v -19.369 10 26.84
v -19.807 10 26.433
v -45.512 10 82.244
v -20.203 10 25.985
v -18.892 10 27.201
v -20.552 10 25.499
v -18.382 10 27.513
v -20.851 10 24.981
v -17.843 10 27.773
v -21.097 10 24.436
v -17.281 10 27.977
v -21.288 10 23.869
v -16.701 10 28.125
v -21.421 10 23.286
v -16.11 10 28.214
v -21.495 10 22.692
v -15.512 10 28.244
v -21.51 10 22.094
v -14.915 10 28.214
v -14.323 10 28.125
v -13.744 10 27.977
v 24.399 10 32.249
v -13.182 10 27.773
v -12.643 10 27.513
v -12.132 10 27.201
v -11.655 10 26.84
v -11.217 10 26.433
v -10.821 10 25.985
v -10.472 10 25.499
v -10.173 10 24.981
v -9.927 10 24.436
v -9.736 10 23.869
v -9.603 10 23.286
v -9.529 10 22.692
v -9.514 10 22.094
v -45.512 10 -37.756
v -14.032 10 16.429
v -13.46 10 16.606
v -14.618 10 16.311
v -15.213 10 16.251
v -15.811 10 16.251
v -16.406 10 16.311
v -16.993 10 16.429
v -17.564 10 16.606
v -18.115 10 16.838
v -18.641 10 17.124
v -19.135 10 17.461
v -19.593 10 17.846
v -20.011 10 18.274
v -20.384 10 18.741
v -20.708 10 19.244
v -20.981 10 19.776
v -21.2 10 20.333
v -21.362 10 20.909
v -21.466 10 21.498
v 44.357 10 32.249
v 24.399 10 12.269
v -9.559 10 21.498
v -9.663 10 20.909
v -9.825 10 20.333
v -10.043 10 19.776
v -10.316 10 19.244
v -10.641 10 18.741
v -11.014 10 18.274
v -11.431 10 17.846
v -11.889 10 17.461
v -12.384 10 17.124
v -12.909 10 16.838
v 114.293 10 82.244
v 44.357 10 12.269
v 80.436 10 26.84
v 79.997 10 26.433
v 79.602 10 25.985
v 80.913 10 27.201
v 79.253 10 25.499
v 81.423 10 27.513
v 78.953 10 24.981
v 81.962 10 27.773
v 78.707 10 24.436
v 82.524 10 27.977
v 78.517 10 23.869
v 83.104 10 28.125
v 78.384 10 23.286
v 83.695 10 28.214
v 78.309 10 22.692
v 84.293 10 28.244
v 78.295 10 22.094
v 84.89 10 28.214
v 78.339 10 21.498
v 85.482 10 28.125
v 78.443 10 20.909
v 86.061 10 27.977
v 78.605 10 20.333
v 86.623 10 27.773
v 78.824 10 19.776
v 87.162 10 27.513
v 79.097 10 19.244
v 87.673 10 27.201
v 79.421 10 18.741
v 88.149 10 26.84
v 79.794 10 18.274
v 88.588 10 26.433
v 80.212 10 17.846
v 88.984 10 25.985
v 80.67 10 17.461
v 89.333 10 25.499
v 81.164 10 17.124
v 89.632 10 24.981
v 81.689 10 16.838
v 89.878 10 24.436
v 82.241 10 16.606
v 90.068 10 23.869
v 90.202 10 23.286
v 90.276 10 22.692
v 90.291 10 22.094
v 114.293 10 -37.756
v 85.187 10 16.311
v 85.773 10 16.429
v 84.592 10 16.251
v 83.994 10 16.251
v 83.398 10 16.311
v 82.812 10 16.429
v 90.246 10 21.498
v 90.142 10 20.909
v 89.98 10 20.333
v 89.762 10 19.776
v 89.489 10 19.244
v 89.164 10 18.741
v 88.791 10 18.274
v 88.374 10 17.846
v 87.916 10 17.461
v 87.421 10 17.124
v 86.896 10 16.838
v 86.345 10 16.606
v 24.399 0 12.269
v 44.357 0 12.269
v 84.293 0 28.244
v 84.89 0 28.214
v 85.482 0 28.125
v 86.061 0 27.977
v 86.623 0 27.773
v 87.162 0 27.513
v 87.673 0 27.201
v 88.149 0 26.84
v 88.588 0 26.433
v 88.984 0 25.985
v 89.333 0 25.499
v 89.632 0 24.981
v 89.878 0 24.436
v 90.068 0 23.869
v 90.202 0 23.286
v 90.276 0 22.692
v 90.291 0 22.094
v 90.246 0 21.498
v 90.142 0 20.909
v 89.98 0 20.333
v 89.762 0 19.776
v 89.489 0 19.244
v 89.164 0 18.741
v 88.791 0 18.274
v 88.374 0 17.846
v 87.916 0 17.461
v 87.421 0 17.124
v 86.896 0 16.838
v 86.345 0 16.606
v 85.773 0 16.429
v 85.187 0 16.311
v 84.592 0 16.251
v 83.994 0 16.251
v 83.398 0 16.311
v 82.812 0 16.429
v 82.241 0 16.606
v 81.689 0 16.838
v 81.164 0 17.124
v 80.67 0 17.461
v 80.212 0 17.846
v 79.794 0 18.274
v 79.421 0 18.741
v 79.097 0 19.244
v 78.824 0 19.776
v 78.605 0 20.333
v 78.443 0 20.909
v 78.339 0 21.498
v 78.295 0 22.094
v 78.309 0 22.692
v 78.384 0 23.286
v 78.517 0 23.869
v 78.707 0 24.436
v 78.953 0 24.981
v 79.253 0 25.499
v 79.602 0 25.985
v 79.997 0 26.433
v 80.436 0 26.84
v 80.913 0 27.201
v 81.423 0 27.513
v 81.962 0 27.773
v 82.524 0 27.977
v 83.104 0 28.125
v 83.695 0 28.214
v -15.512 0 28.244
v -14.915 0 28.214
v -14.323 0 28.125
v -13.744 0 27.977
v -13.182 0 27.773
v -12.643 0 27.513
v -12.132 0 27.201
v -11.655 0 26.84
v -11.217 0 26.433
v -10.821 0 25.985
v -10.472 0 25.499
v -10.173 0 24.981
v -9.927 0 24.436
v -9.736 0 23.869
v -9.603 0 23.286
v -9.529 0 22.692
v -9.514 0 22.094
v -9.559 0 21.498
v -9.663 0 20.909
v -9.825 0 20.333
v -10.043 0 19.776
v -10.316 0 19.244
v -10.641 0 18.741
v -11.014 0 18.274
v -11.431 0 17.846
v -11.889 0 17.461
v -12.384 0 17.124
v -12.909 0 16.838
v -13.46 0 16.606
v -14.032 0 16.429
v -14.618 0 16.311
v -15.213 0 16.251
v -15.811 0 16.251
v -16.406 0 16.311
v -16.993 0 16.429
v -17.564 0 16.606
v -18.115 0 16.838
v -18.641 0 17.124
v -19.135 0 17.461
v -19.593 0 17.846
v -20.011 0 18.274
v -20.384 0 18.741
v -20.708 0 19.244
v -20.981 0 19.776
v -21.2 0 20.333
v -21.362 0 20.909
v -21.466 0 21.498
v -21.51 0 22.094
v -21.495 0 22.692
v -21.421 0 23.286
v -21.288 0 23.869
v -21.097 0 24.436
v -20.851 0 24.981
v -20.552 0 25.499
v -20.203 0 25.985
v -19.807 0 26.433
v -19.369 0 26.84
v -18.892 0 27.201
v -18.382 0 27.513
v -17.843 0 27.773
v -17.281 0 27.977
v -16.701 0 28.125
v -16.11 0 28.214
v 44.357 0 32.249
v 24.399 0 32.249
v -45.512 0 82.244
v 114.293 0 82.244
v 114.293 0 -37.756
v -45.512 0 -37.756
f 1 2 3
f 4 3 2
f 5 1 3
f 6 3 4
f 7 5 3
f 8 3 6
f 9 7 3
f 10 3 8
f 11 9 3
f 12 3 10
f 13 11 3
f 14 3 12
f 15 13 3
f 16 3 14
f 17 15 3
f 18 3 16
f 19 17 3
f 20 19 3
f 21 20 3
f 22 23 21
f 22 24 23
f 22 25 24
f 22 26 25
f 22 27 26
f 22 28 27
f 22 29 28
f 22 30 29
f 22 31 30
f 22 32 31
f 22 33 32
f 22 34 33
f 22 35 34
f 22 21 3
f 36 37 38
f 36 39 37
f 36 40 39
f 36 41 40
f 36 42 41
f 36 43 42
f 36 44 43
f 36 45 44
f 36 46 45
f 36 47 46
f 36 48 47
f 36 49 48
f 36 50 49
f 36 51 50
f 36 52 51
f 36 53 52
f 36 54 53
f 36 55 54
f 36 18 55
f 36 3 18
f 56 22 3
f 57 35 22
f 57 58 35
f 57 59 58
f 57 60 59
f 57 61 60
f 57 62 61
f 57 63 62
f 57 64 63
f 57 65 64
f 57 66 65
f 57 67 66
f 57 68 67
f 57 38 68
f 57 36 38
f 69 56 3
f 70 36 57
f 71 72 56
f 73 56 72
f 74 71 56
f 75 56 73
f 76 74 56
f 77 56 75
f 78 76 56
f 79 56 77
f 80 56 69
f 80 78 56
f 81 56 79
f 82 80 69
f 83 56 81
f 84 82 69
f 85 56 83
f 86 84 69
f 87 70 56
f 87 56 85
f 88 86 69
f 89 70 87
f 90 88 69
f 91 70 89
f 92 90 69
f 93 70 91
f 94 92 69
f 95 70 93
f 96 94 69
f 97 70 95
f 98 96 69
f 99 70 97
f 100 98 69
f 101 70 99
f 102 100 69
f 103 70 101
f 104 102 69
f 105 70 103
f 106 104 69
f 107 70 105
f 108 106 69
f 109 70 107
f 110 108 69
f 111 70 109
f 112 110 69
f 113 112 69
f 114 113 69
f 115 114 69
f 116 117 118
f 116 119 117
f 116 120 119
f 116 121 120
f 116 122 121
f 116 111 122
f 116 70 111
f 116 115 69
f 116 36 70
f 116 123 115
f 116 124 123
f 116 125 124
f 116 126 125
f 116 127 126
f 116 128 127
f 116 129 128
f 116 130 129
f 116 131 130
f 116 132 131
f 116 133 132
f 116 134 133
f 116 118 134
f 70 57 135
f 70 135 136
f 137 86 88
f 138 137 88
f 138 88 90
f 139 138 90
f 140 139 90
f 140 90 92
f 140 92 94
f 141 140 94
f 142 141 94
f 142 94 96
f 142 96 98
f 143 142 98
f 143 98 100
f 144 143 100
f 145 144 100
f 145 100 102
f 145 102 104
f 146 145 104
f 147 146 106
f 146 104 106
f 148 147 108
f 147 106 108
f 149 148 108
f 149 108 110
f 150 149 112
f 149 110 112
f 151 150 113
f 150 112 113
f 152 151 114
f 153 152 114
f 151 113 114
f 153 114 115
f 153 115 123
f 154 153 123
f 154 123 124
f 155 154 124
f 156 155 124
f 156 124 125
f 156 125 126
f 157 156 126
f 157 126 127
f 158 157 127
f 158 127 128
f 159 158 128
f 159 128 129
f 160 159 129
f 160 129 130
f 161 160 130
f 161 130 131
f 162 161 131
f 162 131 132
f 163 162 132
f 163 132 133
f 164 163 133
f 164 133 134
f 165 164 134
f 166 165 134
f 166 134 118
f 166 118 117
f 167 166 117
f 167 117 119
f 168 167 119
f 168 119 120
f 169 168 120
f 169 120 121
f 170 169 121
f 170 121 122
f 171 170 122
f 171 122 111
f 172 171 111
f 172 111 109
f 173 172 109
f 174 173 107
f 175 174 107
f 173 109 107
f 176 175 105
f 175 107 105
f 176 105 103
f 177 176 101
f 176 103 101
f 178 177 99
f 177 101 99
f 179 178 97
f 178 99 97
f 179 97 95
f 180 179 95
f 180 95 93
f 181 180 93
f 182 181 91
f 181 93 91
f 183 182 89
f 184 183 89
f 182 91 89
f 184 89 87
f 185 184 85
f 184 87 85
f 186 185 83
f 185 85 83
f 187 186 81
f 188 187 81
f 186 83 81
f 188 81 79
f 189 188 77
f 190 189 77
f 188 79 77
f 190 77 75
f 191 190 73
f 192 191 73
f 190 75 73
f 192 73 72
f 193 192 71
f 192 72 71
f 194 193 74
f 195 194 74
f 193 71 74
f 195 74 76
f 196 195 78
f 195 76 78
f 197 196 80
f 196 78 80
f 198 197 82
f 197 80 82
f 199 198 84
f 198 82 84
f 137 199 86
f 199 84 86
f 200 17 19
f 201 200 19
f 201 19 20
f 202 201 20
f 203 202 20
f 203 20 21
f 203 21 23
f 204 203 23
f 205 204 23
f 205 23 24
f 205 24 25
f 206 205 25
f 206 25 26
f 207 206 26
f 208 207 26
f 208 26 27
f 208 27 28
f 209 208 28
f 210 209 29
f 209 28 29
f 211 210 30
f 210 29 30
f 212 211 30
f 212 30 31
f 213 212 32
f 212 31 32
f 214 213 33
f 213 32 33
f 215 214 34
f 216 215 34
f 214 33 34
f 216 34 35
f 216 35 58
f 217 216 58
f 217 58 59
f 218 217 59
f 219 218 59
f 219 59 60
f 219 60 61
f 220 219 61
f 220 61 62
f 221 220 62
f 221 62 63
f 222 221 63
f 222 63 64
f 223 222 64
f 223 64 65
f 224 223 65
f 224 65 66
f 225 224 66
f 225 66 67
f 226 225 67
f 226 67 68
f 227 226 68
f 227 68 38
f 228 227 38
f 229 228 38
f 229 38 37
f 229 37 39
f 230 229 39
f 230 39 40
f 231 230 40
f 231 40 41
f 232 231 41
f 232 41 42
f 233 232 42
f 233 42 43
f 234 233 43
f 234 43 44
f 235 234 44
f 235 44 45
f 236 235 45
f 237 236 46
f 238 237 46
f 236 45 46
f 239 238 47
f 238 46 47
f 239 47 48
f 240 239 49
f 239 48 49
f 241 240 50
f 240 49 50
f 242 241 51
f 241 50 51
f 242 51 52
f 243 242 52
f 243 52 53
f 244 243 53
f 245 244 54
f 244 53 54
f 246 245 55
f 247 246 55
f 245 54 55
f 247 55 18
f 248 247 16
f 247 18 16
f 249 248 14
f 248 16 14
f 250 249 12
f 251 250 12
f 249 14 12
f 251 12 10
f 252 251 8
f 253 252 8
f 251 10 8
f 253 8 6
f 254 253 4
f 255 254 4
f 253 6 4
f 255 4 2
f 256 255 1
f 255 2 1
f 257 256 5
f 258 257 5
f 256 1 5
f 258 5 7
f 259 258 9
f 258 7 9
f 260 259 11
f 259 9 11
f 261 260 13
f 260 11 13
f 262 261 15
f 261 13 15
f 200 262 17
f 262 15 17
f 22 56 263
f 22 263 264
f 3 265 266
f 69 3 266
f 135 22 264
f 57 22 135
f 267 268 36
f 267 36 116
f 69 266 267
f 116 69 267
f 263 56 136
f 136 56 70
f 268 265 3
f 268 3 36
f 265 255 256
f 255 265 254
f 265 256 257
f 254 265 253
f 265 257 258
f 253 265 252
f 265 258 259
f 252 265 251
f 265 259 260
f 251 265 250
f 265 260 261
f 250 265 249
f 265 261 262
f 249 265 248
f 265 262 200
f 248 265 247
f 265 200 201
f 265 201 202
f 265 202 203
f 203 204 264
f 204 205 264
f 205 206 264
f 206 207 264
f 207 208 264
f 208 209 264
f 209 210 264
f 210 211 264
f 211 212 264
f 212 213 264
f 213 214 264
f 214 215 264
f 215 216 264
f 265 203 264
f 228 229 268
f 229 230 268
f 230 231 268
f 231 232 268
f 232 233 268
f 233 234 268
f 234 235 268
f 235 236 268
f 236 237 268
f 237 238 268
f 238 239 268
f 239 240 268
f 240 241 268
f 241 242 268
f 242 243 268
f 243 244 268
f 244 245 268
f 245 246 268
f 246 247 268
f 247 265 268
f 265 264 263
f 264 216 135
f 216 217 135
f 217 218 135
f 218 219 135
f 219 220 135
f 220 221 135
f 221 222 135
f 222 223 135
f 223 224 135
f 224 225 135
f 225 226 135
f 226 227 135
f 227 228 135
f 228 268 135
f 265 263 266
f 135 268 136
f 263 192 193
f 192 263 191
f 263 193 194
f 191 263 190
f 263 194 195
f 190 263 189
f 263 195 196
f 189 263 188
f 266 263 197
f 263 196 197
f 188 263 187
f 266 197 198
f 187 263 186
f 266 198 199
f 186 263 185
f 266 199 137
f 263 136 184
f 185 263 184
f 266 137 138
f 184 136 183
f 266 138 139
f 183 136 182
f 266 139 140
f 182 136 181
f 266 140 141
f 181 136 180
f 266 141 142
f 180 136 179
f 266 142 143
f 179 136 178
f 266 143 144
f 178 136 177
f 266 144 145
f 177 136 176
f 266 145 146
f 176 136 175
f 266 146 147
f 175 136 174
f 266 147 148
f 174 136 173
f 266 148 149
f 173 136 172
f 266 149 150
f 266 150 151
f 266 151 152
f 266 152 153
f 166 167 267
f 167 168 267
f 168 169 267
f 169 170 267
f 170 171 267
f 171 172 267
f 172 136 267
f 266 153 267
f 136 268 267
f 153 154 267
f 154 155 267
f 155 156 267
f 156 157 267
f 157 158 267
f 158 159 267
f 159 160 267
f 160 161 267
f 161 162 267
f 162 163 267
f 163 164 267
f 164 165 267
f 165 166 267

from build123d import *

# Parameters (mm, degrees)
SKETCH3_W           = 159.804878049
SKETCH3_H           = 120
BOSS_EXTRUDE1_DEPTH = 10
CUT_EXTRUDE1_DEPTH  = 20
SKETCH5_R           = 6
CUT_EXTRUDE3_DEPTH  = 20


with BuildPart() as part:
    # Sketch3 → Boss-Extrude1 (new body)
    with BuildSketch(Plane(origin=(0, 0, 0), x_dir=(1, 0, 0), z_dir=(0, 1, 0))):
        with Locations((34.390243903, -22.243902439)):
            Rectangle(SKETCH3_W, SKETCH3_H)
    extrude(amount=BOSS_EXTRUDE1_DEPTH)

    # Sketch4 → Cut-Extrude1 (cut)
    with BuildSketch(Plane(origin=(0, 10, 0), x_dir=(1, 0, 0), z_dir=(0, 1, 0))):
        Polygon((44.357270354, -22.243902439), (44.357270354, -32.248924449), (24.398521101, -32.248924449), (24.398521101, -12.268950417), (44.357270354, -12.268950417), align=None)
    extrude(amount=-CUT_EXTRUDE1_DEPTH, mode=Mode.SUBTRACT)

    # Sketch5 → Cut-Extrude3 (cut)
    with BuildSketch(Plane(origin=(0, 10, 0), x_dir=(1, 0, 0), z_dir=(0, 1, 0))):
        with Locations(Location((-15.512195122, -22.243902439, 0), (0, 0, 270))):
            Circle(SKETCH5_R)
        with Locations(Location((84.292682927, -22.243902439, 0), (0, 0, 270))):
            Circle(SKETCH5_R)
    extrude(amount=-CUT_EXTRUDE3_DEPTH, mode=Mode.SUBTRACT)


solid = part.part
